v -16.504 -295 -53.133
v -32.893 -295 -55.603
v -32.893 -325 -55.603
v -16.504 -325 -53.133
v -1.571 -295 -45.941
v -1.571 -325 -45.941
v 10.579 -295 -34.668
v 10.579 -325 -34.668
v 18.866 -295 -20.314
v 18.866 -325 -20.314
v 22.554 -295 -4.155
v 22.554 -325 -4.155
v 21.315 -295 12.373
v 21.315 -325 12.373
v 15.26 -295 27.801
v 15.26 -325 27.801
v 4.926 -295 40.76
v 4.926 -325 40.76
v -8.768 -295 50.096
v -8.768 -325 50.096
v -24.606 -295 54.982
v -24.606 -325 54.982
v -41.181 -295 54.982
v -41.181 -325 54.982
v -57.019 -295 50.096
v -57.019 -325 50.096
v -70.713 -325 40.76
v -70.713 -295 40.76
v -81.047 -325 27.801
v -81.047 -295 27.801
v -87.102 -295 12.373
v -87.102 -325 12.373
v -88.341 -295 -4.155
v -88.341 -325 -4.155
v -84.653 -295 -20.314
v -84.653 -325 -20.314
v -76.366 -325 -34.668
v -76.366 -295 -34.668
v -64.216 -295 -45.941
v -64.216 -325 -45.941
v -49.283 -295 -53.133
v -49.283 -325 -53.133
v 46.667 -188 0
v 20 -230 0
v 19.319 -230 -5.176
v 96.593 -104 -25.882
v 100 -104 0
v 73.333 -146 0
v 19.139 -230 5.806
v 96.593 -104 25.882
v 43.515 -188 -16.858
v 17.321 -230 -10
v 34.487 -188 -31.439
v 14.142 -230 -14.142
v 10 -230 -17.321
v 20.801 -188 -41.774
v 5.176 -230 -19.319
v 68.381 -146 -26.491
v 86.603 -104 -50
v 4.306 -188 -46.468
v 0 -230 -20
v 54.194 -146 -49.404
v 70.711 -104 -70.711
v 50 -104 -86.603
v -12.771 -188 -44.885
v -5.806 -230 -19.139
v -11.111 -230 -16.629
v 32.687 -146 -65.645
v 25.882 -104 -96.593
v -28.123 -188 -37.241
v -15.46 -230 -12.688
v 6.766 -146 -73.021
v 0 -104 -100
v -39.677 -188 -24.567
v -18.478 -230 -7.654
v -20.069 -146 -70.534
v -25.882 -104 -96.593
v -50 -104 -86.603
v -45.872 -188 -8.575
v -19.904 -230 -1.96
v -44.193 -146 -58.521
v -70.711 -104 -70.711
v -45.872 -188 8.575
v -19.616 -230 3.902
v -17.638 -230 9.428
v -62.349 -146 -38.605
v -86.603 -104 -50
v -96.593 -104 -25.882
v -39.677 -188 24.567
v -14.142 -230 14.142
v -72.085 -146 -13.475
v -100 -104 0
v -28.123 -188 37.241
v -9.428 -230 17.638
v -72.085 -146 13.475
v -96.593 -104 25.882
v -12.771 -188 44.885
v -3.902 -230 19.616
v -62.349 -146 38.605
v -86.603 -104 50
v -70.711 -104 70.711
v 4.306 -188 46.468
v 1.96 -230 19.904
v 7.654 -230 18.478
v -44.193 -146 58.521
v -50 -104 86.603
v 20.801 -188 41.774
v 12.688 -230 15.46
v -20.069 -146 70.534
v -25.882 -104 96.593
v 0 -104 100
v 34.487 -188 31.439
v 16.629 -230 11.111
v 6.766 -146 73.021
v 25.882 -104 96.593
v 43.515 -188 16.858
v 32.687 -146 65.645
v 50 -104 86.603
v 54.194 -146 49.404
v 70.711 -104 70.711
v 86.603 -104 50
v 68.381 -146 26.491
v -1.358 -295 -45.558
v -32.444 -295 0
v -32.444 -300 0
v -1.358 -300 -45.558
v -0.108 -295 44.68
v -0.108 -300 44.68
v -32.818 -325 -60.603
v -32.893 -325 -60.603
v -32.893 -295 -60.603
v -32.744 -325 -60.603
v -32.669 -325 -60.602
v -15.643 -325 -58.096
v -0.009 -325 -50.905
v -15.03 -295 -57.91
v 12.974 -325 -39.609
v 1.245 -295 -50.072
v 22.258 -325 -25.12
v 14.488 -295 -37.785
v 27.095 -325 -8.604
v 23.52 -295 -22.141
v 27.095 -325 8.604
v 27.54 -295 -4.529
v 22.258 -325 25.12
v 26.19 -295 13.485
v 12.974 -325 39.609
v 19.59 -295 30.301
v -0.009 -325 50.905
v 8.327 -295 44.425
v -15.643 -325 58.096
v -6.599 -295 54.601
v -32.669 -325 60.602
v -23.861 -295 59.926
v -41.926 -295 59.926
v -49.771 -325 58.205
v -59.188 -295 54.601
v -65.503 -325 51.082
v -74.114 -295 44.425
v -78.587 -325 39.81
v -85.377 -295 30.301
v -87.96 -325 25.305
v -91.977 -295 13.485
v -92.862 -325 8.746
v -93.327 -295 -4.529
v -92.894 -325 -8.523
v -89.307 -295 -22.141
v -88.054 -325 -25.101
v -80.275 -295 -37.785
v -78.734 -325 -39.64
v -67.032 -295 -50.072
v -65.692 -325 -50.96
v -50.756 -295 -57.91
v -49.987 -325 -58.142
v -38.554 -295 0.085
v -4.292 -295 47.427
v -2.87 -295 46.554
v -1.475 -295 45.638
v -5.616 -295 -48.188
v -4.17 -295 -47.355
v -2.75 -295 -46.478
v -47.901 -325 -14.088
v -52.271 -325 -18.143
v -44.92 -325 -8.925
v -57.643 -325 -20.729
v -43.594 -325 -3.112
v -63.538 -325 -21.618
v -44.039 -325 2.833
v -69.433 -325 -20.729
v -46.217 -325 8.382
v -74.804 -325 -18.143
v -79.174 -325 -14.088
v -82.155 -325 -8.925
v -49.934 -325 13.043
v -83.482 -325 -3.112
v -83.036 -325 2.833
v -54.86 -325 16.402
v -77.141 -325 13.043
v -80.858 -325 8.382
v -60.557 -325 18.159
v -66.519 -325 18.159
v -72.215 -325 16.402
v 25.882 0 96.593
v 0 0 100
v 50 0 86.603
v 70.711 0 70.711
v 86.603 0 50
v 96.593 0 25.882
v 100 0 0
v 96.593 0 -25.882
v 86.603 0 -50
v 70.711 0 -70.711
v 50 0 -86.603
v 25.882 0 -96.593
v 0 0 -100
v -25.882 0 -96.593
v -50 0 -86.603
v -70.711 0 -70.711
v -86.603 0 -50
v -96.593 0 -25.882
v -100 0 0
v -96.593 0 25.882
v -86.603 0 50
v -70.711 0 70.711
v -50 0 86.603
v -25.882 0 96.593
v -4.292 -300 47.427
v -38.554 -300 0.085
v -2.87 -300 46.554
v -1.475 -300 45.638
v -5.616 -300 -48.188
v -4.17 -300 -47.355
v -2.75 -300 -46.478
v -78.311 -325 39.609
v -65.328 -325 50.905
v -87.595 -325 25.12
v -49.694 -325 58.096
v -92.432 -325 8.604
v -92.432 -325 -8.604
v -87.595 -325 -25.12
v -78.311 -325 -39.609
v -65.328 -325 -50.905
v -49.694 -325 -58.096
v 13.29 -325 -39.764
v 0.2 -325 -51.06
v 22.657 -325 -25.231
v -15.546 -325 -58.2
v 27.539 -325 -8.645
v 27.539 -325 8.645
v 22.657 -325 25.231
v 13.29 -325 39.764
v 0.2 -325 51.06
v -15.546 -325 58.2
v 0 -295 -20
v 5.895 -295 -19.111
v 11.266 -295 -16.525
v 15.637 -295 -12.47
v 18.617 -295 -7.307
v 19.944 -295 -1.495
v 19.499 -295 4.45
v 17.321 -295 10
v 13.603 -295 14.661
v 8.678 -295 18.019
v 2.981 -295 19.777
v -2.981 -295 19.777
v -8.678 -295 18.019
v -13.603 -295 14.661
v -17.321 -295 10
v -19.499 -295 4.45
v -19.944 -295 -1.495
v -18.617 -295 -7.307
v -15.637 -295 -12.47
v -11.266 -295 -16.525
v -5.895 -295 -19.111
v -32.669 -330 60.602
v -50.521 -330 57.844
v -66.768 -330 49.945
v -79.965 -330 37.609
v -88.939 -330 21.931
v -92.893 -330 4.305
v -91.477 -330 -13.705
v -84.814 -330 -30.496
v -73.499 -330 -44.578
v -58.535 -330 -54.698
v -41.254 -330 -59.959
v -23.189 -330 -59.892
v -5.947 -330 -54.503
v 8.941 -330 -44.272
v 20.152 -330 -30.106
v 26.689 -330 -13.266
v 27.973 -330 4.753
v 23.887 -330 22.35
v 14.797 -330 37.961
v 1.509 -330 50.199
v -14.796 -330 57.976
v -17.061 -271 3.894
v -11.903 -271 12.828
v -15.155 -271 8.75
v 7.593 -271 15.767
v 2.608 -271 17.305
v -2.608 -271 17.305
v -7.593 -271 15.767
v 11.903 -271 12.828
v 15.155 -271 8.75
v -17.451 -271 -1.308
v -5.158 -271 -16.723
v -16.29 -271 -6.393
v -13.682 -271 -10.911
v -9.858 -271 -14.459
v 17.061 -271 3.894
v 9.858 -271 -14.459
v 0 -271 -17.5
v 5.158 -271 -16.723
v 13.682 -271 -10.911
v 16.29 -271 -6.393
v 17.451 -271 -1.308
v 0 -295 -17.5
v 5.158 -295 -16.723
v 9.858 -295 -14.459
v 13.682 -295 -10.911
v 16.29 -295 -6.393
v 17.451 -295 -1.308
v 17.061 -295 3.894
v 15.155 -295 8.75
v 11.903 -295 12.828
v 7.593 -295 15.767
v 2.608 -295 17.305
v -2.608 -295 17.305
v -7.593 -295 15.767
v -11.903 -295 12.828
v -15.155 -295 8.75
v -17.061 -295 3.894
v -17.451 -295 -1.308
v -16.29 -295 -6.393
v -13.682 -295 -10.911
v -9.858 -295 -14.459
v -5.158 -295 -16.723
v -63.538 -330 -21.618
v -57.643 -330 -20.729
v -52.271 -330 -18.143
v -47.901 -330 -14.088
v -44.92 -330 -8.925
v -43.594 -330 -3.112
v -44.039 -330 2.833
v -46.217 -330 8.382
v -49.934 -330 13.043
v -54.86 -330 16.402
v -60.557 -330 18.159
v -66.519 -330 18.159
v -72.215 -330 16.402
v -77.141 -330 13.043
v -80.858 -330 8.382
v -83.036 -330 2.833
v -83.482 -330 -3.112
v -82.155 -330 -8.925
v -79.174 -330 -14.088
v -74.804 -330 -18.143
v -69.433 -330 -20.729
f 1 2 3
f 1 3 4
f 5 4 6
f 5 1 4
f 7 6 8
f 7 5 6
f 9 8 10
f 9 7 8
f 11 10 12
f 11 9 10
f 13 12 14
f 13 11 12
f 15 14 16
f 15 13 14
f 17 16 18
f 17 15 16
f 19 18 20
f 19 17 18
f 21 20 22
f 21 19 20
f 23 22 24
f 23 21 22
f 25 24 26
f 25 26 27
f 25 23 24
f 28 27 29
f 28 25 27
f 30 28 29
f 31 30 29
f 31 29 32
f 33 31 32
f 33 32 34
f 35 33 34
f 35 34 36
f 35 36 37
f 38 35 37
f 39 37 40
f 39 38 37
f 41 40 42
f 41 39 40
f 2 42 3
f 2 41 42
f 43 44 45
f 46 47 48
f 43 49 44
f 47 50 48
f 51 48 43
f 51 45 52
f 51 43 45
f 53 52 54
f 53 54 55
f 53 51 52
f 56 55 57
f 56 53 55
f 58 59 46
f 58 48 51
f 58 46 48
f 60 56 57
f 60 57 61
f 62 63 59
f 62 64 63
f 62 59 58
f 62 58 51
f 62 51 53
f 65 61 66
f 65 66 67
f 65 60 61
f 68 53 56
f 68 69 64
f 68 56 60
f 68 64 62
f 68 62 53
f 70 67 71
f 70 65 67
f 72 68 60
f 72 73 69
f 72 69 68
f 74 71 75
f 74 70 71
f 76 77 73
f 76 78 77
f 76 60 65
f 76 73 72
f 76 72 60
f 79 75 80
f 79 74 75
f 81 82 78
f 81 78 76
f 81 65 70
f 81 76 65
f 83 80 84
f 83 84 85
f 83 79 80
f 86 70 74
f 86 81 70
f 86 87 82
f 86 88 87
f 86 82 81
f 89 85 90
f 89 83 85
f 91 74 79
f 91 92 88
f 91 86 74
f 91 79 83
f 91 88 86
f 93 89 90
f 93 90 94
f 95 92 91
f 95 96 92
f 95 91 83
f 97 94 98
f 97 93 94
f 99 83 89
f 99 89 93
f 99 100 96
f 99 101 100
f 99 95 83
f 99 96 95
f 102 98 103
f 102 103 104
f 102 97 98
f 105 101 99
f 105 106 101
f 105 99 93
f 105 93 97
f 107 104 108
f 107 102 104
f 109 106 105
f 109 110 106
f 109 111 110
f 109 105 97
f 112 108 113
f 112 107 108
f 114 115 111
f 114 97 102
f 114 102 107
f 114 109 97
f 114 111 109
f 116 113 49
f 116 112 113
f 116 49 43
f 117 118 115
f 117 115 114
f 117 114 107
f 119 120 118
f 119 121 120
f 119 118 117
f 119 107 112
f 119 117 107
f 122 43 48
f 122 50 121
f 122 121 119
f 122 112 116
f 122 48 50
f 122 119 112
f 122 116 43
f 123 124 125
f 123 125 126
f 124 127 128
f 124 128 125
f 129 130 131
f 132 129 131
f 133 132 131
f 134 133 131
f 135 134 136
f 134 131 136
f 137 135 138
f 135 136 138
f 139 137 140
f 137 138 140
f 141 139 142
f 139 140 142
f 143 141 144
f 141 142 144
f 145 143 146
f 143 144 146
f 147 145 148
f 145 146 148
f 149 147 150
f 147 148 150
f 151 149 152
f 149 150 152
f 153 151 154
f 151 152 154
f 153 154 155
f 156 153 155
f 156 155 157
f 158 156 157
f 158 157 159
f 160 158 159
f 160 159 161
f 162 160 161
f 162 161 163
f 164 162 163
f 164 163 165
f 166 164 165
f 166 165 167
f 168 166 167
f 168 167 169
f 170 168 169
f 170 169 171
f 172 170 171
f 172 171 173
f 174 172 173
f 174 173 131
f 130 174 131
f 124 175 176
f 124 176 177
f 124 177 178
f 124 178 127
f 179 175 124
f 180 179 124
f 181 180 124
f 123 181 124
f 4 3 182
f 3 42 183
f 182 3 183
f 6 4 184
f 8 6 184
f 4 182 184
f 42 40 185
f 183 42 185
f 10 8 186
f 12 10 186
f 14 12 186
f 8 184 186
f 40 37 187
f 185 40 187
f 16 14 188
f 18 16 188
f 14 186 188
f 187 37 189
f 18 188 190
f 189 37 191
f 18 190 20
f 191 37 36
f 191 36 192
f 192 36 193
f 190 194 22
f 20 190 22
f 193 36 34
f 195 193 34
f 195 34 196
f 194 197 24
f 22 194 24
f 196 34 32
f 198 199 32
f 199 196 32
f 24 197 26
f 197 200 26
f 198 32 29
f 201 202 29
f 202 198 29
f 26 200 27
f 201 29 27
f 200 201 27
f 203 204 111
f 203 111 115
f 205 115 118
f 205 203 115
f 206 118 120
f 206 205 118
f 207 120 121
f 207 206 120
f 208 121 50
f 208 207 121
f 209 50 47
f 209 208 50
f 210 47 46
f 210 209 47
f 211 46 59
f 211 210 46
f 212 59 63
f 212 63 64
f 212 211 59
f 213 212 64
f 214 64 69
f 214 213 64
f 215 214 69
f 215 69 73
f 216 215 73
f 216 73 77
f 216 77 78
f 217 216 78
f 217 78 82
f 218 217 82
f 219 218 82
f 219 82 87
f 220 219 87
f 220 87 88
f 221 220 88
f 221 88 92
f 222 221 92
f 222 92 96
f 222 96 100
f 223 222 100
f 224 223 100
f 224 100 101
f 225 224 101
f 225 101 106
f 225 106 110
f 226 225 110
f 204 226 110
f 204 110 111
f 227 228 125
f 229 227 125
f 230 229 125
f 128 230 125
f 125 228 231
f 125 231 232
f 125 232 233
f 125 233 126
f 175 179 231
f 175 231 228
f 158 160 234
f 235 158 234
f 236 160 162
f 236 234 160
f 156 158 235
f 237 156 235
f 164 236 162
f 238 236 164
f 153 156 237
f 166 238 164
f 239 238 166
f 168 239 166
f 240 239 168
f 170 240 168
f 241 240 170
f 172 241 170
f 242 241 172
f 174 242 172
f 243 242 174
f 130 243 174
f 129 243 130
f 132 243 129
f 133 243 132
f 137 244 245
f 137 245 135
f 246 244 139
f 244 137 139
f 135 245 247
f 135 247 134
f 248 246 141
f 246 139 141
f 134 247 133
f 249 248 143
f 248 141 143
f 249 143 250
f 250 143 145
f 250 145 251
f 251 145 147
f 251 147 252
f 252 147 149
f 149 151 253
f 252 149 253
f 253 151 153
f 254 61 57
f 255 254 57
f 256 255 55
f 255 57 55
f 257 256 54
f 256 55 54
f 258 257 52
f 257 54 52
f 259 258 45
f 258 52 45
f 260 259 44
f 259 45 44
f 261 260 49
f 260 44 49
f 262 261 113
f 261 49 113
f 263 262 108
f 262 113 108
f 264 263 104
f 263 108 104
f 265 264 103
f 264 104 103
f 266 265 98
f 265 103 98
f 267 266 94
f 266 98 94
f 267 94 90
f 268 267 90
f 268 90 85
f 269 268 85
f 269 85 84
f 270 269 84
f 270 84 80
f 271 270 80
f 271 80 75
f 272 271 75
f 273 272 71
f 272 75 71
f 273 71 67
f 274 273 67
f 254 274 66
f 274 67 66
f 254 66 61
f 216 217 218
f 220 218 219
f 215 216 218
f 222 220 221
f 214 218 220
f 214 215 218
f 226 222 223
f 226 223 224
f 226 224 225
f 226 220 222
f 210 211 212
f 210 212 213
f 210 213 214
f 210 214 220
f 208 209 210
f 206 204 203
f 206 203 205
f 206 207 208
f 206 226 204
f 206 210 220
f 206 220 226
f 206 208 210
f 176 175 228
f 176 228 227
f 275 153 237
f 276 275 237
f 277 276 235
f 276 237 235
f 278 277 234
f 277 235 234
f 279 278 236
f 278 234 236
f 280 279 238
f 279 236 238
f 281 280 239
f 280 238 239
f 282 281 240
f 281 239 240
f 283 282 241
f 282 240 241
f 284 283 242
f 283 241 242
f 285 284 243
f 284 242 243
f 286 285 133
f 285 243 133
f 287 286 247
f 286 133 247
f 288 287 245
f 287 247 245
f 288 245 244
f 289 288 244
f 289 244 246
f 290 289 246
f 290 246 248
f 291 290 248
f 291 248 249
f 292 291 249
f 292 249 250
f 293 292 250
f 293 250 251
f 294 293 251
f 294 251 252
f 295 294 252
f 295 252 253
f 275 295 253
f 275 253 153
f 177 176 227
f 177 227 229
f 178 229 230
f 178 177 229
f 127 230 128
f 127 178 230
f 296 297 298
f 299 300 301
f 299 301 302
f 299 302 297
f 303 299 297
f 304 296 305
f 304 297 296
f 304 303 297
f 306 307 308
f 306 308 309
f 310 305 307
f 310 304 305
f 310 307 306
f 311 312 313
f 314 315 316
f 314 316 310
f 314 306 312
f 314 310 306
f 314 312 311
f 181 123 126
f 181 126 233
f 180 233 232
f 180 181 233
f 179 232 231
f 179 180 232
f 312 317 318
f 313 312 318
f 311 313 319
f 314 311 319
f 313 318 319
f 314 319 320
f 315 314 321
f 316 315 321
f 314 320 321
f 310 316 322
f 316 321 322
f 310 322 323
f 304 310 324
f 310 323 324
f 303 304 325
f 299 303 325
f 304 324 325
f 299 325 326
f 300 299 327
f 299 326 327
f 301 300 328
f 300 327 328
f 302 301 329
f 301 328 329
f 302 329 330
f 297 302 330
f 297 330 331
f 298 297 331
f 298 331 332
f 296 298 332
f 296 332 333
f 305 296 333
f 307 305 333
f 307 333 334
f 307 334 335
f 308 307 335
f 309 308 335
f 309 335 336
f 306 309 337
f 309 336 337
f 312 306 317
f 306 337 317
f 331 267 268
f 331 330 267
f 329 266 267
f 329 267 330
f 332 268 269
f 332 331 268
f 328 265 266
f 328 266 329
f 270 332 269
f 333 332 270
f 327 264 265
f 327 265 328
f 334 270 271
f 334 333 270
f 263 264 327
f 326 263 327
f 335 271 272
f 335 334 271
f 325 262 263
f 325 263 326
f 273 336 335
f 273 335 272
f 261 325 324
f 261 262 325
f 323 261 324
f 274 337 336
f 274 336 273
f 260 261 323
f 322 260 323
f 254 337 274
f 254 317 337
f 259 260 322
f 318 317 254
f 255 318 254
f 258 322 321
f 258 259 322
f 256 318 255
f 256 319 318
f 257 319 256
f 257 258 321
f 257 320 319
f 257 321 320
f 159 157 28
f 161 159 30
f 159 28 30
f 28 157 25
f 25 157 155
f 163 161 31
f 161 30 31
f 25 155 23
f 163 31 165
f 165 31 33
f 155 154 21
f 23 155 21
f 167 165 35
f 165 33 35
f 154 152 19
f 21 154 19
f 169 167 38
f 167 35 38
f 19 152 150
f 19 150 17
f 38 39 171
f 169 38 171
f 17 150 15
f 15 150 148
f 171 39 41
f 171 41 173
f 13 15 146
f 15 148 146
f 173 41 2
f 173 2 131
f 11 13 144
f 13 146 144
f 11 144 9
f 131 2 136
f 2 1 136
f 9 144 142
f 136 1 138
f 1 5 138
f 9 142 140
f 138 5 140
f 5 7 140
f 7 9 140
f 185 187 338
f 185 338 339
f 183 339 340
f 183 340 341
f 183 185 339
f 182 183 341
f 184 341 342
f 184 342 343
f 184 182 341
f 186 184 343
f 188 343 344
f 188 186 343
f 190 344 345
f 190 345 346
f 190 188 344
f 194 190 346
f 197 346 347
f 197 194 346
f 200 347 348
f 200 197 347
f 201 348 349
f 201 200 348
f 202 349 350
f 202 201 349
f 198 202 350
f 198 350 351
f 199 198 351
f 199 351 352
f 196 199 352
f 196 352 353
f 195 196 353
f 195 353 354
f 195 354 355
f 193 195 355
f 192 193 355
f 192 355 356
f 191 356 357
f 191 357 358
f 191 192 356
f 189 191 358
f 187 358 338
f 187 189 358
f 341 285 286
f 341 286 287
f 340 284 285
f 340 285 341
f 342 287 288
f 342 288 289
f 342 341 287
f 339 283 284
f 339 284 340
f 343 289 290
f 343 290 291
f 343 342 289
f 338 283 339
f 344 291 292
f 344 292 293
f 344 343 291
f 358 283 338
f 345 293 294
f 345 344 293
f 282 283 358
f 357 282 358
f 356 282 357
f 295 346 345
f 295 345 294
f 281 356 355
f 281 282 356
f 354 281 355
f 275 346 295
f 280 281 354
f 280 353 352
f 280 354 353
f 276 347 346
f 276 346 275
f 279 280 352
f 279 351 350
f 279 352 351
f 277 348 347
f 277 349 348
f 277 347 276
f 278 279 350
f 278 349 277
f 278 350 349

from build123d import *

# Parameters (mm, degrees)
CROQUIS1_R              = 100
SALIENTE_EXTRUIR1_DEPTH = 104
CROQUIS3_R              = 20
CROQUIS2_R              = 100
CROQUIS4_R              = 20
SALIENTE_EXTRUIR2_DEPTH = 65
CROQUIS7_R              = 17.5
CORTAR_EXTRUIR2_DEPTH   = 24
CROQUIS8_R              = 60.602826114
CROQUIS8_R_2            = 55.602826114
SALIENTE_EXTRUIR3_DEPTH = 30
CROQUIS10_R             = 60.602826114
CROQUIS10_R_2           = 20
SALIENTE_EXTRUIR5_DEPTH = 5
SALIENTE_EXTRUIR6_DEPTH = 5


with BuildPart() as part:
    # Croquis1 → Saliente-Extruir1 (new body)
    with BuildSketch(Plane(origin=(0, 0, 0), x_dir=(1, 0, 0), z_dir=(0, 1, 0))):
        with Locations(Location((0, 0, 0), (0, 0, 270))):
            Circle(CROQUIS1_R)
    extrude(amount=-SALIENTE_EXTRUIR1_DEPTH)

    # Croquis3 → Recubrir1 section 0
    with BuildSketch(Plane(origin=(0, -230, 0), x_dir=(1, 0, 0), z_dir=(0, 1, 0))):
        Circle(CROQUIS3_R)
    # Croquis2 → Recubrir1 section 1
    with BuildSketch(Plane.XZ.offset(104)):
        Circle(CROQUIS2_R)
    loft()

    # Croquis4 → Saliente-Extruir2 (add)
    with BuildSketch(Plane.XZ.offset(230)):
        with Locations(Location((0, 0, 0), (0, 0, 270))):
            Circle(CROQUIS4_R)
    extrude(amount=SALIENTE_EXTRUIR2_DEPTH)

    # Croquis7 → Cortar-Extruir2 (cut)
    with BuildSketch(Plane.XZ.offset(295)):
        with Locations(Location((0, 0, 0), (0, 0, 270))):
            Circle(CROQUIS7_R)
    extrude(amount=-CORTAR_EXTRUIR2_DEPTH, mode=Mode.SUBTRACT)


with BuildPart() as body_2:
    # Croquis8 → Saliente-Extruir3 (new body)
    with BuildSketch(Plane.XZ.offset(295)):
        with Locations(Location((-32.893475565, 0, 0), (0, 0, 270))):
            Circle(CROQUIS8_R)
        with Locations(Location((-32.893475565, 0, 0), (0, 0, 270))):
            Circle(CROQUIS8_R_2, mode=Mode.SUBTRACT)
    extrude(amount=SALIENTE_EXTRUIR3_DEPTH)

    # Croquis10 → Saliente-Extruir5 (add)
    with BuildSketch(Plane.XZ.offset(325)):
        with Locations(Location((-32.443615628, 0, 0), (0, 0, 90.212656212))):
            Circle(CROQUIS10_R)
        with Locations(Location((-63.53778642, -1.617860302, 0), (0, 0, 270))):
            Circle(CROQUIS10_R_2, mode=Mode.SUBTRACT)
    extrude(amount=SALIENTE_EXTRUIR5_DEPTH)


with BuildPart() as body_3:
    # Croquis11 → Saliente-Extruir6 (new body)
    with BuildSketch(Plane(origin=(0, -295, 0), x_dir=(1, 0, 0), z_dir=(0, 1, 0))):
        with BuildLine():
            Line((-0.108415749, -44.679799988), (-32.443615628, 0))
            Line((-32.443615628, 0), (-1.357702125, 45.557827647))
            ThreePointArc((-1.357702125, 45.557827647), (-3.456916322, 46.921433711), (-5.615842275, 48.188382989))
            Line((-5.615842275, 48.188382989), (-38.554414262, -0.084600379))
            Line((-38.554414262, -0.084600379), (-4.292100921, -47.42722739))
            ThreePointArc((-4.292100921, -47.42722739), (-2.169076001, -46.100997045), (-0.108415749, -44.679799988))
        make_face()
    extrude(amount=-SALIENTE_EXTRUIR6_DEPTH)


solid = Compound([part.part, body_2.part, body_3.part])
